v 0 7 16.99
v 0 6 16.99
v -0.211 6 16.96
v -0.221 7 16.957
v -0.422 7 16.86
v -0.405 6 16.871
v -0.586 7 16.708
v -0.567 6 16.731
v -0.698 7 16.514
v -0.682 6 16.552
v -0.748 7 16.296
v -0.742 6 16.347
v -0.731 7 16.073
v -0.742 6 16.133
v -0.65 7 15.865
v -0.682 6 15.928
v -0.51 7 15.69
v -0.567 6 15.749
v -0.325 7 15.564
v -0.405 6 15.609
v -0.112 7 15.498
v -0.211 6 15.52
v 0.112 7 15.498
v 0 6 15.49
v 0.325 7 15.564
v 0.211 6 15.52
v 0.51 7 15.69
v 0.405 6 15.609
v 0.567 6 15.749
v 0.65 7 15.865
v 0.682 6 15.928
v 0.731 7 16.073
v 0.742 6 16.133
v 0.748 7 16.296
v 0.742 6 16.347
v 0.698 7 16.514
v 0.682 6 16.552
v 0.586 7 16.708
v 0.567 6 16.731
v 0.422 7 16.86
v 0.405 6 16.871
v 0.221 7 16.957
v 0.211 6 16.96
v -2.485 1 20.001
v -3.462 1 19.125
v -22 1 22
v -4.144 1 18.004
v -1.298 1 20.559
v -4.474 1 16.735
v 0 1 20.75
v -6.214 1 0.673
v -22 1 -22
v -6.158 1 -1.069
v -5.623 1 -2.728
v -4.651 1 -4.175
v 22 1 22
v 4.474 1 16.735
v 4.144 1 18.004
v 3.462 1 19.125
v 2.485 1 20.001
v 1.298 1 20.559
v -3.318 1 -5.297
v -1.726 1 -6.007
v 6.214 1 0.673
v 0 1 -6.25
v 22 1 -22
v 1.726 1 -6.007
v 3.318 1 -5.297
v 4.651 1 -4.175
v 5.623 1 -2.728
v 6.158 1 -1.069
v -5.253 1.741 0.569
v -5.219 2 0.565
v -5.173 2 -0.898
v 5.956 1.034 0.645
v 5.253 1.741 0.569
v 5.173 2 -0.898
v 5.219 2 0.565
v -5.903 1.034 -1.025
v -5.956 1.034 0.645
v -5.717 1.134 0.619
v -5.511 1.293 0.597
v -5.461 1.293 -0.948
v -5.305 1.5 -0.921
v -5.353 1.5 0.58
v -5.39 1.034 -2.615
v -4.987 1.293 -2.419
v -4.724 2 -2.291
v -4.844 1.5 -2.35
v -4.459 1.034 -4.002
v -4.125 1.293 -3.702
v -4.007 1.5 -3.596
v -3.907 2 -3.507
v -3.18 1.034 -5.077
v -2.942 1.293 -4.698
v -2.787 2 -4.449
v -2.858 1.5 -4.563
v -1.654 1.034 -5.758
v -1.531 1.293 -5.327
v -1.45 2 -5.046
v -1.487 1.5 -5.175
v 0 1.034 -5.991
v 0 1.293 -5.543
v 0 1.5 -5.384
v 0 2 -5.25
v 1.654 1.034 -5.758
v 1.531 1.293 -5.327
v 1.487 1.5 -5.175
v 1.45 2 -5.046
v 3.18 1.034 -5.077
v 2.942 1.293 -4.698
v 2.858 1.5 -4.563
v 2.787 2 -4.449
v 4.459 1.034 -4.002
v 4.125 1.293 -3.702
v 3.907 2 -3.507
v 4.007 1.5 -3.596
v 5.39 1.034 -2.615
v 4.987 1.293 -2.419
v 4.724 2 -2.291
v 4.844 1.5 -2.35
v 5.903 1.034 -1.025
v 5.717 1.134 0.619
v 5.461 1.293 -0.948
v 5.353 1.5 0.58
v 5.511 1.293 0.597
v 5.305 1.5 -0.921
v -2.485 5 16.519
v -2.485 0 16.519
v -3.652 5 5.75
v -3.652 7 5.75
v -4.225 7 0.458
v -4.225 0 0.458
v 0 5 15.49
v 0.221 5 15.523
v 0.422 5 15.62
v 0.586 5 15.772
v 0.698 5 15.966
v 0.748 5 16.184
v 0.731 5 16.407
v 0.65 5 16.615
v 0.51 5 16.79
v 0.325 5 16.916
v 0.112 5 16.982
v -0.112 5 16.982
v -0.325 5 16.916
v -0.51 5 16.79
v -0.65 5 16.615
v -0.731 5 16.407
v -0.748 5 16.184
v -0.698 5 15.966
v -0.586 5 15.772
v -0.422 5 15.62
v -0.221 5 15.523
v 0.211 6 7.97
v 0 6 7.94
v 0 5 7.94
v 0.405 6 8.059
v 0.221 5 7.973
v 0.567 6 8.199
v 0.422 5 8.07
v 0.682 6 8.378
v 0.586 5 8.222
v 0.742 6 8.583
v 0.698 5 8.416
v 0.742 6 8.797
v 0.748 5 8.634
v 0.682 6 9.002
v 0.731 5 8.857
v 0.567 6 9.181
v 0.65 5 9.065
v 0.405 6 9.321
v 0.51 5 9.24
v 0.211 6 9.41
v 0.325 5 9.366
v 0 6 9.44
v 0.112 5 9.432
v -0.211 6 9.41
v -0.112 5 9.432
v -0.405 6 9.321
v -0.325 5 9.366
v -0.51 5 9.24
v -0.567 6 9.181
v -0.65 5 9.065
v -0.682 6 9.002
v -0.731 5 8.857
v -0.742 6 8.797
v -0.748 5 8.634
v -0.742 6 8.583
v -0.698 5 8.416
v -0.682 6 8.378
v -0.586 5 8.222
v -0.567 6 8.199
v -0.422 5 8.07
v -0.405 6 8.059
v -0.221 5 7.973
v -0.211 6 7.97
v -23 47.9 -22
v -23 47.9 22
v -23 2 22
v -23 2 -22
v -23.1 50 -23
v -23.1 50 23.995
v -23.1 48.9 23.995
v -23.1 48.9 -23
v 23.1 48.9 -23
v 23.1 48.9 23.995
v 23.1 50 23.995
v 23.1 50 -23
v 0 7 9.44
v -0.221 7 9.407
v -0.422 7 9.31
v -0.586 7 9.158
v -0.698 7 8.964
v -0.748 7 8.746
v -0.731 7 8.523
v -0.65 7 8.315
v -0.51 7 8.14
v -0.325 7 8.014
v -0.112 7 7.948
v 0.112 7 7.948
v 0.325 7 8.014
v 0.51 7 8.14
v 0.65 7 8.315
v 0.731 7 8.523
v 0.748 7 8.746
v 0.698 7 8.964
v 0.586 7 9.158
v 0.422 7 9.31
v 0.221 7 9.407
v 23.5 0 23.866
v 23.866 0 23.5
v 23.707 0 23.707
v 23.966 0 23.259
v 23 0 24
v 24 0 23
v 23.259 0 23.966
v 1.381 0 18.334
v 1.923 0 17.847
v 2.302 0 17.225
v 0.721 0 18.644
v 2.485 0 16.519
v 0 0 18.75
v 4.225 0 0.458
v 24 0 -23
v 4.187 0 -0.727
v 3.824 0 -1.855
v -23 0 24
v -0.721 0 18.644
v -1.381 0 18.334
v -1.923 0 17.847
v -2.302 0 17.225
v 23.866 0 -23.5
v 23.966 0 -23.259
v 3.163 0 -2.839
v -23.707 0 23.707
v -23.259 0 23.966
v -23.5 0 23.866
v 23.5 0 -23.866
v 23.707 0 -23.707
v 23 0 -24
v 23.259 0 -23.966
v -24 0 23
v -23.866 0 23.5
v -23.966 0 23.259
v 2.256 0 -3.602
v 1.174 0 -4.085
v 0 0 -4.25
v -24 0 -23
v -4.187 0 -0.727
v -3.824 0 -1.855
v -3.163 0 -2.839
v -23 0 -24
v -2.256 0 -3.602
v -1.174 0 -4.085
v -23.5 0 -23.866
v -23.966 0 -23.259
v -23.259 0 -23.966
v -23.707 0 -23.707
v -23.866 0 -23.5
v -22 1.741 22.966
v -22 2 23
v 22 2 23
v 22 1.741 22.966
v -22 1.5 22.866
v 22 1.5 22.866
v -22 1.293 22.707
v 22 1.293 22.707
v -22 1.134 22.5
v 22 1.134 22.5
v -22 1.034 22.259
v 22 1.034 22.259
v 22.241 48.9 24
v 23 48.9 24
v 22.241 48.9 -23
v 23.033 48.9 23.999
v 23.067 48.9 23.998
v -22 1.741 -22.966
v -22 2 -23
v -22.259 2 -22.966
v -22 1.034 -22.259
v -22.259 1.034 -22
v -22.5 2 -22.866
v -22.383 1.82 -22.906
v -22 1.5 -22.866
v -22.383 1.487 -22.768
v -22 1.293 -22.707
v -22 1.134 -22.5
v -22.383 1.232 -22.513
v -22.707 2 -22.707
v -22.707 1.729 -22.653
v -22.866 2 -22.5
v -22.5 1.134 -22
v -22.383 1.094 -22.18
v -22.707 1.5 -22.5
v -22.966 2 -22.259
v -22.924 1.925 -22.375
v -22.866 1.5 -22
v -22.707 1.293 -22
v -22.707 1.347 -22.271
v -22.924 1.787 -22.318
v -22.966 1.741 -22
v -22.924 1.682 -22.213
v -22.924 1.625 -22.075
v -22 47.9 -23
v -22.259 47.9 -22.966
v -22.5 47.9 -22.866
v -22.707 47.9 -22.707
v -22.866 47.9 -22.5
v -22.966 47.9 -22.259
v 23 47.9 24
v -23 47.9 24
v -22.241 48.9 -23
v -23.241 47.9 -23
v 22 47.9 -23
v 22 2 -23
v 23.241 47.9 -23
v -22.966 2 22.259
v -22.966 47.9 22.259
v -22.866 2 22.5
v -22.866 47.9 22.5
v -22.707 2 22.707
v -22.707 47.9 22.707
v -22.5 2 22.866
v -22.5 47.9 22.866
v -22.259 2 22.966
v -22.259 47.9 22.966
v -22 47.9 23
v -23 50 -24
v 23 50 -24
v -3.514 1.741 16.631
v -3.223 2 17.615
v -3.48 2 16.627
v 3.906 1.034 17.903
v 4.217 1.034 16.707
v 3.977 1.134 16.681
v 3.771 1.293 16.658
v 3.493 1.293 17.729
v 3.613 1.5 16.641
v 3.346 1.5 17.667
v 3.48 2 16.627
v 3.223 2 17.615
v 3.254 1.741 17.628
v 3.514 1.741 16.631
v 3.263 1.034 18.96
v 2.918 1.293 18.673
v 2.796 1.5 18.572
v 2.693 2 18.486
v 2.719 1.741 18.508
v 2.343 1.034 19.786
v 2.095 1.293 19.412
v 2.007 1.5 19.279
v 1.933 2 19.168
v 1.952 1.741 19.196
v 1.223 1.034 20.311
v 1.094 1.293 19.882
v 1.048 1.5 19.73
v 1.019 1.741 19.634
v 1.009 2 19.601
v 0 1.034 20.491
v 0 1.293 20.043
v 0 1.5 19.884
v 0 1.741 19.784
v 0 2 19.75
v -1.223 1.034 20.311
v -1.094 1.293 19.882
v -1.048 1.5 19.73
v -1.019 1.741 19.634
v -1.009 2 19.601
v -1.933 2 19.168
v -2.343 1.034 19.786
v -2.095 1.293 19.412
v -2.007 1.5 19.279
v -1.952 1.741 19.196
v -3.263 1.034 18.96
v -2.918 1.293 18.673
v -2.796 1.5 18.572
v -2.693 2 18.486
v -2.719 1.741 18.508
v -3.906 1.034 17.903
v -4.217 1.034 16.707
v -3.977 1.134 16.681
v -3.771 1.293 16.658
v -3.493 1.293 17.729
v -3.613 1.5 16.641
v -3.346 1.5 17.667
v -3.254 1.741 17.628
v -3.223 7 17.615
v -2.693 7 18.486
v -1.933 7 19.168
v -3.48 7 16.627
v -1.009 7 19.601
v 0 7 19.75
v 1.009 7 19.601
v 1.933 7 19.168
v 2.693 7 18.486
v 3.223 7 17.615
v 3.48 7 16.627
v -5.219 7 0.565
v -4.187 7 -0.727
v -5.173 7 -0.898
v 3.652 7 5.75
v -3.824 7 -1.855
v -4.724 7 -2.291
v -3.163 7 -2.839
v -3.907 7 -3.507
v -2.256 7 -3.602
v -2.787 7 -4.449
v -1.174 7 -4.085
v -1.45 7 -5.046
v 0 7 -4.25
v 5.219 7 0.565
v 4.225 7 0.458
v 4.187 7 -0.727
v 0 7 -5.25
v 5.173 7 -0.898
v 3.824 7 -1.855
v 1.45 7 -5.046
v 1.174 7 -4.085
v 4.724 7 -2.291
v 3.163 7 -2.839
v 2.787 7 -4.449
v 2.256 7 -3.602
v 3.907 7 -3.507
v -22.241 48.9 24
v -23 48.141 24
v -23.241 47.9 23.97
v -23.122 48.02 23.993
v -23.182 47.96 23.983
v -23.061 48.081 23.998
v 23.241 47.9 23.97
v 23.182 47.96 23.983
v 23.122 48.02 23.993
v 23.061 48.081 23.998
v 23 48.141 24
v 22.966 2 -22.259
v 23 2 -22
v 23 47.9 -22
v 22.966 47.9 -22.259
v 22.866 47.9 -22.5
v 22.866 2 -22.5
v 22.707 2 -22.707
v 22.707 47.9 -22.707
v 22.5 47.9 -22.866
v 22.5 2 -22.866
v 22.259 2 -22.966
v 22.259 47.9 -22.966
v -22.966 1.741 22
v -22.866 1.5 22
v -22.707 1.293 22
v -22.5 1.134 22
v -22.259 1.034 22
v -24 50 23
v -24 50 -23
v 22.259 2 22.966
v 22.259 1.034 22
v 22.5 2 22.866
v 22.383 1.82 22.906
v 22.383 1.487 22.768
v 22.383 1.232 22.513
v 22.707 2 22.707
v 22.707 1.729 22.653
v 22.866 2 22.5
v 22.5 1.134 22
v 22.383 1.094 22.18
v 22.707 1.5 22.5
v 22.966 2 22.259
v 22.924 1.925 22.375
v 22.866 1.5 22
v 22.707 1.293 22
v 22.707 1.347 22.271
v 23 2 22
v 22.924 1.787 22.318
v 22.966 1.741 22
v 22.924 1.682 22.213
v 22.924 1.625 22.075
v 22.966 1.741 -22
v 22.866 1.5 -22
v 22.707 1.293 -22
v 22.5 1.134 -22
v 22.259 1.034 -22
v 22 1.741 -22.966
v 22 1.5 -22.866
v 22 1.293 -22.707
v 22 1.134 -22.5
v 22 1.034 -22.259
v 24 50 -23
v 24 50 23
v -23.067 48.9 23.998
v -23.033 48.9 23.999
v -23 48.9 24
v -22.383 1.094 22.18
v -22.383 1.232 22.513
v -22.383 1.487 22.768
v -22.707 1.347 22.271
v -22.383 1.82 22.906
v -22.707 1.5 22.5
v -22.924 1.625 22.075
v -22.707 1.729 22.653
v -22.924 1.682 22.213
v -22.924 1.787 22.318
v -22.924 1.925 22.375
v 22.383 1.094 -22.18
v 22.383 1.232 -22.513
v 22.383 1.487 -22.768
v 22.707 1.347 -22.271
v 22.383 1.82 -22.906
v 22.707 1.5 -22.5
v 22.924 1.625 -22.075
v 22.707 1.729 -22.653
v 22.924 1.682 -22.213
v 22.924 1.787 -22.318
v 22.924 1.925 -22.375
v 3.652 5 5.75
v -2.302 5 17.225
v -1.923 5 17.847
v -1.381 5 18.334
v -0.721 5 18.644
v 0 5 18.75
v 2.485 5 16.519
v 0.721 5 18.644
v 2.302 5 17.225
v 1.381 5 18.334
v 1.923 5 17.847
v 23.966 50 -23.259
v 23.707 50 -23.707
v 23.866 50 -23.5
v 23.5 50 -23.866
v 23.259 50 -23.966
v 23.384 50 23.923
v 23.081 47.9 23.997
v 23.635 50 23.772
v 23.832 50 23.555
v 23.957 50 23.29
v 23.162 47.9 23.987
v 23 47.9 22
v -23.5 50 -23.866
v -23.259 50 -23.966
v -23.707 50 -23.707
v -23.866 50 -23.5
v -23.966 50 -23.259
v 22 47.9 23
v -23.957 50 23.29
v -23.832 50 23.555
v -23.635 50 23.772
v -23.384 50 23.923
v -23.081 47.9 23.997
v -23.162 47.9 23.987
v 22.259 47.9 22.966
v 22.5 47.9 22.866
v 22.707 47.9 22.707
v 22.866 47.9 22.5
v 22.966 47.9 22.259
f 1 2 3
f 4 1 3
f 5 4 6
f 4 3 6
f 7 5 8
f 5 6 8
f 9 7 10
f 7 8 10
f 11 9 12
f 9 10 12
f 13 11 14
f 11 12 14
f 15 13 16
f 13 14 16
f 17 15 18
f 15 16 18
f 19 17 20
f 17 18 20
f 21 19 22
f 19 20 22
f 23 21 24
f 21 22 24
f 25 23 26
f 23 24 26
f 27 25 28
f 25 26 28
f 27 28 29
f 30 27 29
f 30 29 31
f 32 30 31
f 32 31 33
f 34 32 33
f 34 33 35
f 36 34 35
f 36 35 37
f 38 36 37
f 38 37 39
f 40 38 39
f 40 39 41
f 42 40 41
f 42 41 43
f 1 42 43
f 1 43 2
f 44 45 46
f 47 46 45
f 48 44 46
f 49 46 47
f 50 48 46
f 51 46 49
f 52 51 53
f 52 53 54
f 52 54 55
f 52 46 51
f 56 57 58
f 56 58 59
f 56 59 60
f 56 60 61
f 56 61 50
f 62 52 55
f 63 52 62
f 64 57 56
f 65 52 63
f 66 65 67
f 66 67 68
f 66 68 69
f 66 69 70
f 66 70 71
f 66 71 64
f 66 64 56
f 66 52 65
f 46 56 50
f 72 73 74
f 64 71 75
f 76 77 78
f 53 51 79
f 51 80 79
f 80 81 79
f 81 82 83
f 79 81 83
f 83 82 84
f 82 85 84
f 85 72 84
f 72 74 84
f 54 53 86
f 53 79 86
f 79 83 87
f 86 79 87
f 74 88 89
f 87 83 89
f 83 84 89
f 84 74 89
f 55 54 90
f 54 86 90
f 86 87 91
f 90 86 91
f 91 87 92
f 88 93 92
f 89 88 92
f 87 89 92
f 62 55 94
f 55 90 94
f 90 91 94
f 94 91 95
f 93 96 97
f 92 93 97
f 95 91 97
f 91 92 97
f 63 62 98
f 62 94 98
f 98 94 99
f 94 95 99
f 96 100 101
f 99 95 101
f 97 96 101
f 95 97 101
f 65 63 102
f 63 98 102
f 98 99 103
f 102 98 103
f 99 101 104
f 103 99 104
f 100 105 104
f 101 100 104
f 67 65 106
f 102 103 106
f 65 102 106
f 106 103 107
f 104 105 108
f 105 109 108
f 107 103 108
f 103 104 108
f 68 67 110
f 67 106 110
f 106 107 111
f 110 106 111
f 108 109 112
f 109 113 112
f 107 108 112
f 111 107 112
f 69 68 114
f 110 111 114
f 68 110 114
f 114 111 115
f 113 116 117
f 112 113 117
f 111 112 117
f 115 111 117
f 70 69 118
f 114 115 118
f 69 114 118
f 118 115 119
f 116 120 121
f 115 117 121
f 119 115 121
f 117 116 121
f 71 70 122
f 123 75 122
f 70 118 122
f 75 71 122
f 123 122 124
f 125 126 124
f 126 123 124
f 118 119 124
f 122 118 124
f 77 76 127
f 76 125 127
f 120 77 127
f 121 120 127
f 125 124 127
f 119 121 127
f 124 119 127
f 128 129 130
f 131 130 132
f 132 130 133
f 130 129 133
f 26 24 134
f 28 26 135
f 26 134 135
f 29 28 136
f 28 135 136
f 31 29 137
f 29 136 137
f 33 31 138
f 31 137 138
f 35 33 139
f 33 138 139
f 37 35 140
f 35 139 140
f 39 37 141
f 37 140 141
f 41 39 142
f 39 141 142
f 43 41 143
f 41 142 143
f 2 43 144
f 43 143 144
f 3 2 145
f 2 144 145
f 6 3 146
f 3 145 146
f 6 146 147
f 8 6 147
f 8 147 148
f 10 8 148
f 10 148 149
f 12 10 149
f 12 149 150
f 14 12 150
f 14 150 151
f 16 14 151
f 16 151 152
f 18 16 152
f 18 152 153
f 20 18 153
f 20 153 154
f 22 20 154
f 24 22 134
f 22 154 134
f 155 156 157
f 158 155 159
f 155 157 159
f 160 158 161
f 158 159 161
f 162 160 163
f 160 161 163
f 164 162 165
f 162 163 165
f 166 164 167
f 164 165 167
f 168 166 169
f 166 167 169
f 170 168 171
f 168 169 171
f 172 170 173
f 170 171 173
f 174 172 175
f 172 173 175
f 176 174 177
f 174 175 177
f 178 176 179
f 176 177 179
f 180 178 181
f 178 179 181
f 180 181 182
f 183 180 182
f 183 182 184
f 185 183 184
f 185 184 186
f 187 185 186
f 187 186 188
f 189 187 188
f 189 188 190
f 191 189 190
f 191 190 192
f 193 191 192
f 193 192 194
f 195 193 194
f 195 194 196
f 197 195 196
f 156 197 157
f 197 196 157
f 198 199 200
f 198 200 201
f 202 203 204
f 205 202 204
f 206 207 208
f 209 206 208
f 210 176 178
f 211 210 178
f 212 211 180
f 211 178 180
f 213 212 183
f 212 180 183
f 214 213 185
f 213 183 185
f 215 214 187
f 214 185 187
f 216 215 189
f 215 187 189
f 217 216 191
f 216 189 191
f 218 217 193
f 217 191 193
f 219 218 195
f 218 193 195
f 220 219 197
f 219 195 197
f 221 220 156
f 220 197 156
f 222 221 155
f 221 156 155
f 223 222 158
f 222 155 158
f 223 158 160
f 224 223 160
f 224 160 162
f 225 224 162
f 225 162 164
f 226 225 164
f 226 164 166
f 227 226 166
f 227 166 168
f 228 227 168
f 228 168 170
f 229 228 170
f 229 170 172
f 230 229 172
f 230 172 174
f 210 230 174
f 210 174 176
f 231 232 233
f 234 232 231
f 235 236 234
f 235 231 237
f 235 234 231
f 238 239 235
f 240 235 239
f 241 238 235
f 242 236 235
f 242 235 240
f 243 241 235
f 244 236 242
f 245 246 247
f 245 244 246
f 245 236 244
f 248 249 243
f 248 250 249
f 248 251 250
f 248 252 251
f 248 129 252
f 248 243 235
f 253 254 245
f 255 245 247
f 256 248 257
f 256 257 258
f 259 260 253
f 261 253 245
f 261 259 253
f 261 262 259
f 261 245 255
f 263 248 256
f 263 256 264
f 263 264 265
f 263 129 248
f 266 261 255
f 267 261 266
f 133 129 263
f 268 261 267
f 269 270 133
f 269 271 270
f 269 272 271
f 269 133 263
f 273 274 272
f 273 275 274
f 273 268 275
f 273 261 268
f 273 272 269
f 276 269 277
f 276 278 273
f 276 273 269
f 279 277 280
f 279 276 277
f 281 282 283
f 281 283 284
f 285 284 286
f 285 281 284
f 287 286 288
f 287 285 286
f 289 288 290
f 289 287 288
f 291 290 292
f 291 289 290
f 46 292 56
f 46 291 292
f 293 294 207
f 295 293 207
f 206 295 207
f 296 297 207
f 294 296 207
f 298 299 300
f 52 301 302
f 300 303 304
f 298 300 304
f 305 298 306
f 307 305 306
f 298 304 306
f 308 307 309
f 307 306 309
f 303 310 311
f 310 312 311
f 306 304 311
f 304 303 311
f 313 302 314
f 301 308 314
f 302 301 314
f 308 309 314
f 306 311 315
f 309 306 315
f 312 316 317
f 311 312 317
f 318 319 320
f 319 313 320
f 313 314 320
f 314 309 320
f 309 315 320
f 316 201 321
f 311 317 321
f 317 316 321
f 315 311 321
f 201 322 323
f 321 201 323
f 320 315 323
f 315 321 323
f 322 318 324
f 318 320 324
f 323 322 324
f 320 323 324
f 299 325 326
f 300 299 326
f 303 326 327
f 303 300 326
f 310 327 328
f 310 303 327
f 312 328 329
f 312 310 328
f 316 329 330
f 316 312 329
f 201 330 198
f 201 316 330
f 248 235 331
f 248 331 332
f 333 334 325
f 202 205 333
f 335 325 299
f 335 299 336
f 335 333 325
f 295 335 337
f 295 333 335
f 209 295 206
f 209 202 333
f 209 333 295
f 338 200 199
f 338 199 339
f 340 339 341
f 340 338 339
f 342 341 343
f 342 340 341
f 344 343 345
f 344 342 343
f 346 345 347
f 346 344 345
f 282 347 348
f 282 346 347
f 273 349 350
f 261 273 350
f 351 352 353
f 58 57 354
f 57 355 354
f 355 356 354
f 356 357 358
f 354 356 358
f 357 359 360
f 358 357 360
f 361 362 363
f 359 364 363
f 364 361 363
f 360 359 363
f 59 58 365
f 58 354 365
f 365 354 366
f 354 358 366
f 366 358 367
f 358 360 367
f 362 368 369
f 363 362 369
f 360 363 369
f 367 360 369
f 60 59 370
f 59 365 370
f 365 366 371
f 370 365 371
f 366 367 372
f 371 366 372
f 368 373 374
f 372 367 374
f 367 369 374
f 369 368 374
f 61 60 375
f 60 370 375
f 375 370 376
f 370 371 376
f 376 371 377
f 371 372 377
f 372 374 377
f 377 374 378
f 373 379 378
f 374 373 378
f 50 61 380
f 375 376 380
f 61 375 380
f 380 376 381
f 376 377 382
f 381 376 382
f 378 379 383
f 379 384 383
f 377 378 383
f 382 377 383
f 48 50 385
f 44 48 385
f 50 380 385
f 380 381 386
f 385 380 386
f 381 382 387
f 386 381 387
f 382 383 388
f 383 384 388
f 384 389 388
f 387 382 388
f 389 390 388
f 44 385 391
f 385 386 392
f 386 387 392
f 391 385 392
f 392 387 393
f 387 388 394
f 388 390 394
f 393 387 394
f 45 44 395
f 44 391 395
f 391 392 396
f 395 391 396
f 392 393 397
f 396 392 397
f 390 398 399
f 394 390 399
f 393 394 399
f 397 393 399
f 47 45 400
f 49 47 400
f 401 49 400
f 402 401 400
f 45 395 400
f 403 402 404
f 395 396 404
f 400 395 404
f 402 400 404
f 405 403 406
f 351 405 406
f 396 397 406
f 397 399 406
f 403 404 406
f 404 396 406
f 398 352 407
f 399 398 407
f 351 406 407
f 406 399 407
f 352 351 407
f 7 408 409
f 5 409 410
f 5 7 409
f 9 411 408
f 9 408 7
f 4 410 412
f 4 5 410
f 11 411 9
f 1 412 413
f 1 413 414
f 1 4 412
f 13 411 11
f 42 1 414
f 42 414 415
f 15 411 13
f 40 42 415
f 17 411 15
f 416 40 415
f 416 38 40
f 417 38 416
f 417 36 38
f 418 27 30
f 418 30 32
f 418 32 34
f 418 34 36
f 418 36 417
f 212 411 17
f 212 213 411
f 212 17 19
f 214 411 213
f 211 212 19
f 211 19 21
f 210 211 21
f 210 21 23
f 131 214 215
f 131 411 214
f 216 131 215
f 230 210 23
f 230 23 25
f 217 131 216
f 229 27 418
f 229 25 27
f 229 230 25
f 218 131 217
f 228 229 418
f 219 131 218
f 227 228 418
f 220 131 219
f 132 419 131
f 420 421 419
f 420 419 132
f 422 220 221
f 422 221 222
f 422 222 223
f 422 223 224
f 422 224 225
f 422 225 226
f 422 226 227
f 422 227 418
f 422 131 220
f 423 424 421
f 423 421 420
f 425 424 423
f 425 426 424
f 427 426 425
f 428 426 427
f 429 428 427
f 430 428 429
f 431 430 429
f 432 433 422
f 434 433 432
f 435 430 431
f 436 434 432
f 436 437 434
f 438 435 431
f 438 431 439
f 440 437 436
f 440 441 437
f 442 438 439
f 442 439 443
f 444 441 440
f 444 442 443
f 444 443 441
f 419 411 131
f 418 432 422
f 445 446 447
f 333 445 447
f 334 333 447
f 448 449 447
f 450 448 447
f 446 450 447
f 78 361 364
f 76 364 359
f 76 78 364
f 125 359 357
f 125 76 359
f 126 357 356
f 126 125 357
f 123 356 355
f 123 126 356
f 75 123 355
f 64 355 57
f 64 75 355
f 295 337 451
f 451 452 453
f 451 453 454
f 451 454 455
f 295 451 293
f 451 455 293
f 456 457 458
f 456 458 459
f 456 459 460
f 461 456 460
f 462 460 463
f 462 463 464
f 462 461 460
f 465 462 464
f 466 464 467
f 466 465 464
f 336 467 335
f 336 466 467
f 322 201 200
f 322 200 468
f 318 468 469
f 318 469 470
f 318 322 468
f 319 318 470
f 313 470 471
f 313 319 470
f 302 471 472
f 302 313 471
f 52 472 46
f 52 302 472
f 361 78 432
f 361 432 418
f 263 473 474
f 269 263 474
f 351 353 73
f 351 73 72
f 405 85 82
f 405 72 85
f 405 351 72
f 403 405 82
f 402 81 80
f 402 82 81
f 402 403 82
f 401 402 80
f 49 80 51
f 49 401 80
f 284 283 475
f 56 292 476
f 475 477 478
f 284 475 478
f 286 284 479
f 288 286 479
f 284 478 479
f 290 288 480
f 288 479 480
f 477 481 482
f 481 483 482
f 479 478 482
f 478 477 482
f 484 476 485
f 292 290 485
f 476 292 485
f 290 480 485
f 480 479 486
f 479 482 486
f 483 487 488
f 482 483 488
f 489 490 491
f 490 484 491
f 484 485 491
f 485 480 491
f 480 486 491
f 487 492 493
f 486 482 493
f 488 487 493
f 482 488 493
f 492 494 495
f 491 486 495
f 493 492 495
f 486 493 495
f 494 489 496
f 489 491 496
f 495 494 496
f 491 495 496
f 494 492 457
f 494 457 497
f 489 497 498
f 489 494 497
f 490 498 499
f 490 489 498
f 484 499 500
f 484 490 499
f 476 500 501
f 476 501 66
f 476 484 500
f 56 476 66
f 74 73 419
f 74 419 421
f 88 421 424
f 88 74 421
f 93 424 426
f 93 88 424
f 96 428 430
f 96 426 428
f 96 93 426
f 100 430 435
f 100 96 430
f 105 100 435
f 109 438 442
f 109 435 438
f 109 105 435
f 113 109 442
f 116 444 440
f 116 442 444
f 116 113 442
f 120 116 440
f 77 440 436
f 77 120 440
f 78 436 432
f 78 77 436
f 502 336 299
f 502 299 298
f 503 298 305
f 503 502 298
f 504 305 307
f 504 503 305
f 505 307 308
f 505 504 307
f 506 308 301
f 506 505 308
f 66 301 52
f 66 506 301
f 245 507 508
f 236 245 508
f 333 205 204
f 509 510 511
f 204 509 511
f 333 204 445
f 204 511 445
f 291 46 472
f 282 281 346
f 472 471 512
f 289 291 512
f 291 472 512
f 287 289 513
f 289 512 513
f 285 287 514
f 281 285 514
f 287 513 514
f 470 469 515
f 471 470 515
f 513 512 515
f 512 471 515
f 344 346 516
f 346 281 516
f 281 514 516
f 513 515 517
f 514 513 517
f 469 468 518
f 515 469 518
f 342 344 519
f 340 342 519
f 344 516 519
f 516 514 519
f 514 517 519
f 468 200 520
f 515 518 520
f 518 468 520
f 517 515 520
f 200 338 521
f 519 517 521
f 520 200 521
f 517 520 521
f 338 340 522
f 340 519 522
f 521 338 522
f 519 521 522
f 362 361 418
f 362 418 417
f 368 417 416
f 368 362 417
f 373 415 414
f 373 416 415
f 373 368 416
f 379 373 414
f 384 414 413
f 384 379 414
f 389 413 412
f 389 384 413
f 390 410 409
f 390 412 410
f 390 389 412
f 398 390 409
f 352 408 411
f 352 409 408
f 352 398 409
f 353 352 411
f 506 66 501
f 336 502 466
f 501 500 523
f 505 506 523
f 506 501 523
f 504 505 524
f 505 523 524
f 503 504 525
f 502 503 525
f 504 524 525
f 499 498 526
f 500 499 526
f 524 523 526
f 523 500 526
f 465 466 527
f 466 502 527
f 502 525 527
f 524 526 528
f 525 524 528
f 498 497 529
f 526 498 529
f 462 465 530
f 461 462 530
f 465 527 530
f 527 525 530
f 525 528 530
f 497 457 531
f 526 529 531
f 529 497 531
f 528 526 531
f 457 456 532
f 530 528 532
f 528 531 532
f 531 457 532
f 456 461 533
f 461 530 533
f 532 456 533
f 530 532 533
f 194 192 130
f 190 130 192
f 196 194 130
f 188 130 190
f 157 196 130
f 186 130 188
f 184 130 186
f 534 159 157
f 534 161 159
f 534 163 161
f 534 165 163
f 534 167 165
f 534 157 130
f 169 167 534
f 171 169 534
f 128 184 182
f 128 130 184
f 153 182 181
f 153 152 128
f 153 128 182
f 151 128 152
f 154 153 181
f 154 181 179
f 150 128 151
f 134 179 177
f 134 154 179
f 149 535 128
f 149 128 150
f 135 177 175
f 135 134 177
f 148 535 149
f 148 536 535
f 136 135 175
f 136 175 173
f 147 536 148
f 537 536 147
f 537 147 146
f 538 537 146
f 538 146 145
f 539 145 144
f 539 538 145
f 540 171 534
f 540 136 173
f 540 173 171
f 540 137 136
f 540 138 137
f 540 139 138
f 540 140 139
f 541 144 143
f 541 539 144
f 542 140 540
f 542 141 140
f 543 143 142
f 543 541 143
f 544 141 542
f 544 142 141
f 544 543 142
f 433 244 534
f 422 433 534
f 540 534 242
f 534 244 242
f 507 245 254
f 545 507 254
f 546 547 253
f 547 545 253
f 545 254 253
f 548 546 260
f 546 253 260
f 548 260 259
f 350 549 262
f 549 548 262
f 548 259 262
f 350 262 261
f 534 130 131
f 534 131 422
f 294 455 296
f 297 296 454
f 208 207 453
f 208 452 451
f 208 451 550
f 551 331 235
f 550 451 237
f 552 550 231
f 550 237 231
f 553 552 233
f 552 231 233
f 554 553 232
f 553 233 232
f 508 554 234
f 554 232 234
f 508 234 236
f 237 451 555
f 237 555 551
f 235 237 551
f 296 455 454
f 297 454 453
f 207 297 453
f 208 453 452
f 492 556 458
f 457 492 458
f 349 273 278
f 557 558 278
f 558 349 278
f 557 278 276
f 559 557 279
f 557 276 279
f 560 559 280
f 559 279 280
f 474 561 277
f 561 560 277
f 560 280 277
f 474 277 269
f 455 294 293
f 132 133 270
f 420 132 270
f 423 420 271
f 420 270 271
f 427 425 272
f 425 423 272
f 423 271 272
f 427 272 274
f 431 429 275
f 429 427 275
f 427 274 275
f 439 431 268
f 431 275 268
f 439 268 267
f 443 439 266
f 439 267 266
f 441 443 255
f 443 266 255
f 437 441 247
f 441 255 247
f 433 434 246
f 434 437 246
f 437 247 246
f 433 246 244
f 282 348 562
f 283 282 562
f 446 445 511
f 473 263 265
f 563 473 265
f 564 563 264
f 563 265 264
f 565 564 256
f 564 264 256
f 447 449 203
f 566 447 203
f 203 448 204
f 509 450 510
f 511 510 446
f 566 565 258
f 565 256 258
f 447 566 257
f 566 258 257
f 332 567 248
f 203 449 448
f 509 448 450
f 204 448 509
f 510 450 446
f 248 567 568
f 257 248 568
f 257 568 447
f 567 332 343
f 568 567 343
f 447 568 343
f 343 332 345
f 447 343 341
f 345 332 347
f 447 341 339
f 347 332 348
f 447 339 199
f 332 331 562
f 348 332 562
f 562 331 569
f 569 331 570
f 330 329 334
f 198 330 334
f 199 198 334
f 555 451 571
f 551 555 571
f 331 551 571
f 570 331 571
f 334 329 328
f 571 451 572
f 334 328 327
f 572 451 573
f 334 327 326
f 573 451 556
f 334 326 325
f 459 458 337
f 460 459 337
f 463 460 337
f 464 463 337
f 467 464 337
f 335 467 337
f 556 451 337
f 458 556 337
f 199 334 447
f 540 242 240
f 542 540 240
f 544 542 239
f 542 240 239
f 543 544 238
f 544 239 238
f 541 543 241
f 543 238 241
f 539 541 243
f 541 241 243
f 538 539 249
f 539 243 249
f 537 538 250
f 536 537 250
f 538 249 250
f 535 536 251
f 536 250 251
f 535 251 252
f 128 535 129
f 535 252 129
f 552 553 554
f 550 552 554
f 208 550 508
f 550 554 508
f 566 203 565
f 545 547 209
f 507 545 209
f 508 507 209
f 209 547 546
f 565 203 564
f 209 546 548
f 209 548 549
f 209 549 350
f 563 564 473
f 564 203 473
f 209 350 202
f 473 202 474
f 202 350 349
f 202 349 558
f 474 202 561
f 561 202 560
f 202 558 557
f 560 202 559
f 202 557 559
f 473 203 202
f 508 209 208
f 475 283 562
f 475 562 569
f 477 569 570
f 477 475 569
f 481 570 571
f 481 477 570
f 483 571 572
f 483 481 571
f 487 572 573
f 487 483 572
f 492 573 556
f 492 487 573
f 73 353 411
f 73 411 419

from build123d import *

# Parameters (mm, degrees)
EXTRUDE_1_DEPTH     = 50
CUT_EXTRUDE_1_DEPTH = 47
CUT_EXTRUDE_3_DEPTH = 6
SHELL_START         = 1
SHELL_1_OUTLINE_W   = 46
SHELL_1_OUTLINE_H   = 46
SHELL_1_DEPTH       = 46.9
SHELL_START_2       = 7
SHELL_1_2_DEPTH     = 40.9
CUT_EXTRUDE_4_REACH = 57.57
FILLET_2_R          = 1
EXTRUDE_START       = 1
SKETCH_10_R         = 0.7500000000000009
EXTRUDE_3_DEPTH     = 1


# Read off the part's stored shape, not the designer's step: 抽壳1
with BuildPart() as part:
    # 草图1 → 凸台-拉伸1 (new body)
    with BuildSketch(Plane(origin=(0, 0, 0), x_dir=(1, 0, 0), z_dir=(0, 1, 0))):
        Polygon((-24.000000000000007, 24.000000000000004), (23.999999999999993, 24.000000000000004), (24.000000000000004, -24), (-23.999999999999996, -24), align=None)
    extrude(amount=EXTRUDE_1_DEPTH)

    # 草图2 → 切除-拉伸1 (cut)
    with BuildSketch(Plane.XY.offset(24)):
        Polygon((23.1, 50), (23.000000000000004, 50), (23.000000000000004, 49.00000000000004), (22.000000000000007, 49.00000000000005), (23.000000000000004, 48.000000000000036), (22.000000000000117, 47.99999999999991), (21.000000000000004, 49.00000000000004), (-20.99999999999999, 49.00000000000003), (-21.99999999999998, 48.00000000000006), (-22.999999999999975, 48.00000000000005), (-21.999999999999996, 49.000000000000036), (-22.999999999999996, 49.000000000000036), (-22.999999999999996, 50), (-23.09999999999999, 50), (-23.099999999999994, 48.900000000000034), (-22.241421356237293, 48.900000000000034), (-23.24142135623728, 47.900000000000055), (-21.958578643762664, 47.90000000000006), (-20.95857864376269, 48.900000000000034), (20.9585786437627, 48.90000000000004), (21.95857864376282, 47.8999999999999), (23.241421356237286, 47.90000000000006), (22.24142135623732, 48.90000000000004), (23.1, 48.90000000000004), align=None)
        Polygon((23.000000000000004, 49.00000000000004), (23.000000000000004, 50), (-22.999999999999996, 50), (-22.999999999999996, 49.000000000000036), (-21.999999999999996, 49.000000000000036), (-22.999999999999975, 48.00000000000005), (-21.99999999999998, 48.00000000000006), (-20.99999999999999, 49.00000000000003), (21.000000000000004, 49.00000000000004), (22.000000000000117, 47.99999999999991), (23.000000000000004, 48.000000000000036), (22.000000000000007, 49.00000000000005), align=None)
        Polygon((-20.95857864376269, 48.900000000000034), (-21.958578643762664, 47.90000000000006), (21.95857864376282, 47.8999999999999), (20.9585786437627, 48.90000000000004), align=None)
    extrude(amount=-CUT_EXTRUDE_1_DEPTH, mode=Mode.SUBTRACT)

    # 草图6 → 切除-拉伸3 (cut)
    with BuildSketch(Plane.XZ):
        with BuildLine():
            Line((4.225283156367072, 0.45769230769231345), (2.485460680215815, 16.519230769230756))
            ThreePointArc((2.485460680215815, 16.519230769230756), (-1.2012e-13, 18.75), (-2.485460680216046, 16.51923076923075))
            Line((-2.485460680216046, 16.51923076923075), (-4.225283156367078, 0.4576923076922684))
            ThreePointArc((-4.225283156367078, 0.4576923076922684), (2.187e-14, -4.250000000000001), (4.225283156367072, 0.45769230769231345))
        make_face()
    extrude(amount=-CUT_EXTRUDE_3_DEPTH, mode=Mode.SUBTRACT)

    # 抽壳1 outline → 抽壳1 (cut)
    with BuildSketch(Plane(origin=(0, 0, 0), x_dir=(1, 0, 0), z_dir=(0, 1, 0)).offset(SHELL_START)):
        Rectangle(SHELL_1_OUTLINE_W, SHELL_1_OUTLINE_H)
        with BuildLine():
            Line((-3.479644952, -16.626923077), (-5.219467428, -0.565384615))
            ThreePointArc((-5.219467428, -0.565384615), (0, 5.25), (5.219467428, -0.565384615))
            Line((5.219467428, -0.565384615), (3.479644952, -16.626923077))
            ThreePointArc((3.479644952, -16.626923077), (0, -19.75), (-3.479644952, -16.626923077))
        make_face(mode=Mode.SUBTRACT)
    extrude(amount=SHELL_1_DEPTH, mode=Mode.SUBTRACT)

    # Shell 1 2 outline → Shell 1 2 (cut)
    with BuildSketch(Plane(origin=(0, 0, 0), x_dir=(1, 0, 0), z_dir=(0, 1, 0)).offset(SHELL_START_2)):
        with BuildLine():
            ThreePointArc((5.219467428, -0.565384615), (0, 5.25), (-5.219467428, -0.565384615))
            Line((-5.219467428, -0.565384615), (-3.479644952, -16.626923077))
            ThreePointArc((-3.479644952, -16.626923077), (0, -19.75), (3.479644952, -16.626923077))
            Line((3.479644952, -16.626923077), (5.219467428, -0.565384615))
        make_face()
    extrude(amount=SHELL_1_2_DEPTH, mode=Mode.SUBTRACT)

    # 草图7 → 切除-拉伸4 (cut, up to next)
    with BuildSketch(Plane.XZ.offset(-6), mode=Mode.PRIVATE) as cut_extrude_4_sk1:
        with BuildLine():
            ThreePointArc((1.0553e-13, -4.25), (3.1628857320248525, -2.8387768221812744), (4.225283156367072, 0.45769230769231267))
            Line((4.225283156367072, 0.45769230769231345), (3.6520083174819797, 5.75000000000003))
            Line((3.6520083174819793, 5.750000000000031), (-3.997e-14, 5.750000000000005))
            Line((-4.015e-14, 5.750000000000007), (2.968e-14, -4.25))
        make_face()
    cut_extrude_4_tool1 = extrude(cut_extrude_4_sk1.sketch, amount=-CUT_EXTRUDE_4_REACH, mode=Mode.PRIVATE) & part.part
    # 草图7 → 切除-拉伸4 (cut, up to next)
    with BuildSketch(Plane.XZ.offset(-6), mode=Mode.PRIVATE) as cut_extrude_4_sk2:
        with BuildLine():
            ThreePointArc((-4.225283156367077, 0.4576923076922684), (-3.162885732024767, -2.8387768221813694), (1.0553e-13, -4.25))
            Line((2.968e-14, -4.25), (-4.015e-14, 5.750000000000007))
            Line((-3.997e-14, 5.750000000000005), (-3.6520083174820606, 5.74999999999998))
            Line((-3.6520083174820623, 5.7499999999999805), (-4.225283156367078, 0.45769230769226965))
        make_face()
    cut_extrude_4_tool2 = extrude(cut_extrude_4_sk2.sketch, amount=-CUT_EXTRUDE_4_REACH, mode=Mode.PRIVATE) & part.part
    # 草图7 → 切除-拉伸4 (cut, up to next)
    with BuildSketch(Plane.XZ.offset(-6), mode=Mode.PRIVATE) as cut_extrude_4_sk3:
        with BuildLine():
            ThreePointArc((-7.866e-14, 9.439999999999992), (-0.7500000000000644, 8.689999999999989), (-7.185e-14, 7.9399999999999915))
            Line((-5.544e-14, 7.939999999999991), (-6.592e-14, 9.43999999999999))
        make_face()
    cut_extrude_4_tool3 = extrude(cut_extrude_4_sk3.sketch, amount=-CUT_EXTRUDE_4_REACH, mode=Mode.PRIVATE) & part.part
    # 草图7 → 切除-拉伸4 (cut, up to next)
    with BuildSketch(Plane.XZ.offset(-6), mode=Mode.PRIVATE) as cut_extrude_4_sk4:
        with BuildLine():
            Line((-6.592e-14, 9.43999999999999), (-5.544e-14, 7.939999999999991))
            ThreePointArc((-7.185e-14, 7.9399999999999915), (0.5303300858898444, 8.15966991411008), (0.7499999999999369, 8.689999999999992))
            ThreePointArc((0.7499999999999369, 8.689999999999992), (0.5303300858898421, 9.220330085889909), (-7.866e-14, 9.439999999999992))
        make_face()
    cut_extrude_4_tool4 = extrude(cut_extrude_4_sk4.sketch, amount=-CUT_EXTRUDE_4_REACH, mode=Mode.PRIVATE) & part.part
    # 草图7 → 切除-拉伸4 (cut, up to next)
    with BuildSketch(Plane.XZ.offset(-6), mode=Mode.PRIVATE) as cut_extrude_4_sk5:
        with BuildLine():
            ThreePointArc((-7.866e-14, 9.439999999999992), (-0.7500000000000644, 8.689999999999989), (-7.185e-14, 7.9399999999999915))
            Line((-5.544e-14, 7.939999999999991), (-6.592e-14, 9.43999999999999))
        make_face()
    cut_extrude_4_tool5 = extrude(cut_extrude_4_sk5.sketch, amount=-CUT_EXTRUDE_4_REACH, mode=Mode.PRIVATE) & part.part
    # 草图7 → 切除-拉伸4 (cut, up to next)
    with BuildSketch(Plane.XZ.offset(-6), mode=Mode.PRIVATE) as cut_extrude_4_sk6:
        with BuildLine():
            Line((-6.592e-14, 9.43999999999999), (-5.544e-14, 7.939999999999991))
            ThreePointArc((-7.185e-14, 7.9399999999999915), (0.5303300858898444, 8.15966991411008), (0.7499999999999369, 8.689999999999992))
            ThreePointArc((0.7499999999999369, 8.689999999999992), (0.5303300858898421, 9.220330085889909), (-7.866e-14, 9.439999999999992))
        make_face()
    cut_extrude_4_tool6 = extrude(cut_extrude_4_sk6.sketch, amount=-CUT_EXTRUDE_4_REACH, mode=Mode.PRIVATE) & part.part
    # 草图7 → 切除-拉伸4 (cut, up to next)
    with BuildSketch(Plane.XZ.offset(-6), mode=Mode.PRIVATE) as cut_extrude_4_sk7:
        with BuildLine():
            ThreePointArc((0.7499999999998826, 16.24), (0.5303300858897884, 16.770330085889913), (-1.3142e-13, 16.99))
            Line((-1.1864e-13, 16.989999999999995), (-1.0817e-13, 15.489999999999998))
            ThreePointArc((-1.2411e-13, 15.489999999999998), (0.5303300858897908, 15.709669914110085), (0.7499999999998826, 16.24))
        make_face()
    cut_extrude_4_tool7 = extrude(cut_extrude_4_sk7.sketch, amount=-CUT_EXTRUDE_4_REACH, mode=Mode.PRIVATE) & part.part
    # 草图7 → 切除-拉伸4 (cut, up to next)
    with BuildSketch(Plane.XZ.offset(-6), mode=Mode.PRIVATE) as cut_extrude_4_sk8:
        with BuildLine():
            Line((-1.0817e-13, 15.489999999999998), (-1.1864e-13, 16.989999999999995))
            ThreePointArc((-1.3142e-13, 16.99), (-0.7500000000001174, 16.239999999999995), (-1.2344e-13, 15.489999999999998))
        make_face()
    cut_extrude_4_tool8 = extrude(cut_extrude_4_sk8.sketch, amount=-CUT_EXTRUDE_4_REACH, mode=Mode.PRIVATE) & part.part
    # 草图7 → 切除-拉伸4 (cut, up to next)
    with BuildSketch(Plane.XZ.offset(-6), mode=Mode.PRIVATE) as cut_extrude_4_sk9:
        with BuildLine():
            ThreePointArc((0.7499999999998826, 16.24), (0.5303300858897884, 16.770330085889913), (-1.3142e-13, 16.99))
            Line((-1.1864e-13, 16.989999999999995), (-1.0817e-13, 15.489999999999998))
            ThreePointArc((-1.2411e-13, 15.489999999999998), (0.5303300858897908, 15.709669914110085), (0.7499999999998826, 16.24))
        make_face()
    cut_extrude_4_tool9 = extrude(cut_extrude_4_sk9.sketch, amount=-CUT_EXTRUDE_4_REACH, mode=Mode.PRIVATE) & part.part
    # 草图7 → 切除-拉伸4 (cut, up to next)
    with BuildSketch(Plane.XZ.offset(-6), mode=Mode.PRIVATE) as cut_extrude_4_sk10:
        with BuildLine():
            Line((-1.0817e-13, 15.489999999999998), (-1.1864e-13, 16.989999999999995))
            ThreePointArc((-1.3142e-13, 16.99), (-0.7500000000001174, 16.239999999999995), (-1.2344e-13, 15.489999999999998))
        make_face()
    cut_extrude_4_tool10 = extrude(cut_extrude_4_sk10.sketch, amount=-CUT_EXTRUDE_4_REACH, mode=Mode.PRIVATE) & part.part
    add(cut_extrude_4_tool1.solids().sort_by_distance((1.915714, 6, 1.033627))[0], mode=Mode.SUBTRACT)
    add(cut_extrude_4_tool2.solids().sort_by_distance((-1.915714, 6, 1.033627))[0], mode=Mode.SUBTRACT)
    add(cut_extrude_4_tool3.solids().sort_by_distance((-0.31831, 6, 8.69))[0], mode=Mode.SUBTRACT)
    add(cut_extrude_4_tool4.solids().sort_by_distance((0.31831, 6, 8.69))[0], mode=Mode.SUBTRACT)
    add(cut_extrude_4_tool5.solids().sort_by_distance((-0.31831, 6, 8.69))[0], mode=Mode.SUBTRACT)
    add(cut_extrude_4_tool6.solids().sort_by_distance((0.31831, 6, 8.69))[0], mode=Mode.SUBTRACT)
    add(cut_extrude_4_tool7.solids().sort_by_distance((0.31831, 6, 16.24))[0], mode=Mode.SUBTRACT)
    add(cut_extrude_4_tool8.solids().sort_by_distance((-0.31831, 6, 16.24))[0], mode=Mode.SUBTRACT)
    add(cut_extrude_4_tool9.solids().sort_by_distance((0.31831, 6, 16.24))[0], mode=Mode.SUBTRACT)
    add(cut_extrude_4_tool10.solids().sort_by_distance((-0.31831, 6, 16.24))[0], mode=Mode.SUBTRACT)

    # 圆角2
    # the kernel refuses this fillet: 1 mm, written as the material it adds along each edge
    with BuildSketch(Plane(origin=(22, 2, -22), x_dir=(0, -1, 0), z_dir=(1, 0, 0))) as fillet_2_piece_1_section:
        Polygon((0, 0), (FILLET_2_R, 0), (FILLET_2_R, FILLET_2_R), (0, FILLET_2_R), align=None)
    fillet_2_piece_1 = extrude(amount=FILLET_2_R, mode=Mode.PRIVATE)
    fillet_2_piece_1 = fillet_2_piece_1 - Plane(origin=(22, 2, -22), x_dir=(0, 0.7071067811865475, 0.7071067811865475), z_dir=(1, 0, 0)) * Sphere(FILLET_2_R, mode=Mode.PRIVATE)
    add(fillet_2_piece_1)
    with BuildSketch(Plane(origin=(-22, 2, -22), x_dir=(0, -1, 0), z_dir=(-1, 0, 0))) as fillet_2_piece_2_section:
        Polygon((0, 0), (FILLET_2_R, 0), (FILLET_2_R, -FILLET_2_R), (0, -FILLET_2_R), align=None)
    fillet_2_piece_2 = extrude(amount=FILLET_2_R, mode=Mode.PRIVATE)
    fillet_2_piece_2 = fillet_2_piece_2 - Plane(origin=(-22, 2, -22), x_dir=(0, 0.7071067811865475, 0.7071067811865475), z_dir=(-1, 0, 0)) * Sphere(FILLET_2_R, mode=Mode.PRIVATE)
    add(fillet_2_piece_2)
    with BuildSketch(Plane(origin=(22, 2, 22), x_dir=(0, -1, 0), z_dir=(1, 0, 0))) as fillet_2_piece_3_section:
        Polygon((0, 0), (FILLET_2_R, 0), (FILLET_2_R, -FILLET_2_R), (0, -FILLET_2_R), align=None)
    fillet_2_piece_3 = extrude(amount=FILLET_2_R, mode=Mode.PRIVATE)
    fillet_2_piece_3 = fillet_2_piece_3 - Plane(origin=(22, 2, 22), x_dir=(0, 0.7071067811865475, -0.7071067811865475), z_dir=(1, 0, 0)) * Sphere(FILLET_2_R, mode=Mode.PRIVATE)
    add(fillet_2_piece_3)
    with BuildSketch(Plane(origin=(-22, 2, 22), x_dir=(0, -1, 0), z_dir=(-1, 0, 0))) as fillet_2_piece_4_section:
        Polygon((0, 0), (FILLET_2_R, 0), (FILLET_2_R, FILLET_2_R), (0, FILLET_2_R), align=None)
    fillet_2_piece_4 = extrude(amount=FILLET_2_R, mode=Mode.PRIVATE)
    fillet_2_piece_4 = fillet_2_piece_4 - Plane(origin=(-22, 2, 22), x_dir=(0, 0.7071067811865475, -0.7071067811865475), z_dir=(-1, 0, 0)) * Sphere(FILLET_2_R, mode=Mode.PRIVATE)
    add(fillet_2_piece_4)
    with BuildSketch(Plane(origin=(-1.1e-16, 1, 16.250000000327525), x_dir=(0.9941842720930342, 0, 0.1076923076307851), z_dir=(0.1076923076307851, 0, -0.9941842720930342))) as fillet_2_piece_5:
        with BuildLine():
            CenterArc((3.4999999996724753 + FILLET_2_R, -FILLET_2_R), FILLET_2_R, 90, 90)
            Line((3.4999999996724753, -FILLET_2_R), (3.4999999996724753, 0))
            Line((3.4999999996724753, 0), (3.4999999996724753 + FILLET_2_R, 0))
        make_face()
    revolve(axis=Axis((-1.1e-16, 1, 16.250000000327525), (0, -1, 0)), revolution_arc=167.63539153430426)
    with BuildSketch(Plane(origin=(5.219467428, 1, 0.565384615), x_dir=(0.994184272087703, 0, 0.10769230768000165), z_dir=(-0.10769230768000165, 0, 0.994184272087703))) as fillet_2_piece_6:
        with BuildLine():
            CenterArc((FILLET_2_R, FILLET_2_R), FILLET_2_R, 180, 90)
            Line((0, FILLET_2_R), (0, 0))
            Line((0, 0), (FILLET_2_R, 0))
        make_face()
    extrude(amount=16.15549442184609)
    with BuildSketch(Plane(origin=(0, 1.0, -4.4436987423068786e-10), x_dir=(-0.9941842720841496, 0, 0.10769230771280479), z_dir=(0.10769230771280479, 0, 0.9941842720841496))) as fillet_2_piece_7:
        with BuildLine():
            CenterArc((5.24999999955563 + FILLET_2_R, -FILLET_2_R), FILLET_2_R, 90, 90)
            Line((5.24999999955563, -FILLET_2_R), (5.24999999955563, 0))
            Line((5.24999999955563, 0), (5.24999999955563 + FILLET_2_R, 0))
        make_face()
    revolve(axis=Axis((0, 1.0, -4.4436987423068786e-10), (0, -1, 0)), revolution_arc=192.36460847514948)
    with BuildSketch(Plane(origin=(-3.479644952, 1, 16.626923077), x_dir=(-0.9941842720877031, 0, 0.10769230768000167), z_dir=(-0.10769230768000165, 0, -0.994184272087703))) as fillet_2_piece_8:
        with BuildLine():
            CenterArc((FILLET_2_R, FILLET_2_R), FILLET_2_R, 180, 90)
            Line((0, FILLET_2_R), (0, 0))
            Line((0, 0), (FILLET_2_R, 0))
        make_face()
    extrude(amount=16.15549442184609)
    with BuildSketch(Plane(origin=(22, 1, -23), x_dir=(0, 0, 1), z_dir=(-1, 0, 0)), Plane(origin=(23, 1, 22), x_dir=(-1, 0, 0), z_dir=(0, 0, -1)), Plane(origin=(-22, 1, 23), x_dir=(0, 0, -1), z_dir=(1, 0, 0))) as fillet_2_piece_9:
        with BuildLine():
            CenterArc((FILLET_2_R, FILLET_2_R), FILLET_2_R, 180, 90)
            Line((0, FILLET_2_R), (0, 0))
            Line((0, 0), (FILLET_2_R, 0))
        make_face()
    extrude(amount=44)
    with BuildSketch(Plane(origin=(-23, 1.9999999999999998, -23), x_dir=(0, 0, 1), z_dir=(0, 1, 0))) as fillet_2_piece_10:
        with BuildLine():
            CenterArc((FILLET_2_R, FILLET_2_R), FILLET_2_R, 180, 90)
            Line((0, FILLET_2_R), (0, 0))
            Line((0, 0), (FILLET_2_R, 0))
        make_face()
    extrude(amount=45.9)
    with BuildSketch(Plane(origin=(23, 1.9999999999999998, -23), x_dir=(0, 0, 1), z_dir=(0, 1, 0)), Plane(origin=(23, 1.9999999999999998, 23), x_dir=(-1, 0, 0), z_dir=(0, 1, 0)), Plane(origin=(-23, 1.9999999999999998, 23), x_dir=(0, 0, -1), z_dir=(0, 1, 0))) as fillet_2_piece_11:
        with BuildLine():
            CenterArc((FILLET_2_R, -FILLET_2_R), FILLET_2_R, 90, 90)
            Line((0, -FILLET_2_R), (0, 0))
            Line((0, 0), (FILLET_2_R, 0))
        make_face()
    extrude(amount=45.9)
    with BuildSketch(Plane(origin=(-23, 1, -22), x_dir=(0, 1, 0), z_dir=(0, 0, 1))) as fillet_2_piece_12:
        with BuildLine():
            CenterArc((FILLET_2_R, -FILLET_2_R), FILLET_2_R, 90, 90)
            Line((0, -FILLET_2_R), (0, 0))
            Line((0, 0), (FILLET_2_R, 0))
        make_face()
    extrude(amount=44)
    # the kernel refuses this fillet: 1 mm, written as the material it takes off along each edge
    with BuildSketch(Plane(origin=(23.999999999999993, -2.5, -24.000000000000004), x_dir=(-1, 0, 0), z_dir=(0, 1, 0)), Plane(origin=(-23.999999999999996, -2.5, 24), x_dir=(1, 0, 0), z_dir=(0, 1, 0))) as fillet_2_2_piece_1:
        with BuildLine():
            CenterArc((FILLET_2_R, FILLET_2_R), FILLET_2_R, 180, 90)
            Line((0, FILLET_2_R), (0, 0))
            Line((0, 0), (FILLET_2_R, 0))
        make_face()
    extrude(amount=55, mode=Mode.SUBTRACT)
    with BuildSketch(Plane(origin=(24.000000000000004, -2.5, 24), x_dir=(-1, 0, 0), z_dir=(0, 1, 0)), Plane(origin=(-24.000000000000007, -2.5, -24.000000000000004), x_dir=(1, 0, 0), z_dir=(0, 1, 0))) as fillet_2_2_piece_2:
        with BuildLine():
            CenterArc((FILLET_2_R, -FILLET_2_R), FILLET_2_R, 90, 89.9999999999998)
            Line((0, -FILLET_2_R), (0, 0))
            Line((0, 0), (FILLET_2_R, 0))
        make_face()
    extrude(amount=55, mode=Mode.SUBTRACT)

    # 草图10 → 凸台-拉伸3 (add)
    with BuildSketch(Plane.XZ.offset(-6).offset(EXTRUDE_START)):
        with BuildLine():
            Line((-3.6520083174820623, 5.74999999999998), (3.6520083174819797, 5.75000000000003))
            Line((3.6520083174819797, 5.75000000000003), (2.4854606802158132, 16.519230769230756))
            ThreePointArc((2.4854606802158132, 16.519230769230756), (-1.2012e-13, 18.749999999999996), (-2.485460680216047, 16.51923076923075))
            Line((-2.485460680216047, 16.51923076923075), (-3.6520083174820623, 5.74999999999998))
        make_face()
        with Locations(Location((-6.372e-14, 8.689999999999992, 0), (0, 0, 270))):
            Circle(SKETCH_10_R, mode=Mode.SUBTRACT)
        with Locations(Location((-1.1731e-13, 16.24, 0), (0, 0, 270))):
            Circle(SKETCH_10_R, mode=Mode.SUBTRACT)
    extrude(amount=-EXTRUDE_3_DEPTH)


solid = part.part
